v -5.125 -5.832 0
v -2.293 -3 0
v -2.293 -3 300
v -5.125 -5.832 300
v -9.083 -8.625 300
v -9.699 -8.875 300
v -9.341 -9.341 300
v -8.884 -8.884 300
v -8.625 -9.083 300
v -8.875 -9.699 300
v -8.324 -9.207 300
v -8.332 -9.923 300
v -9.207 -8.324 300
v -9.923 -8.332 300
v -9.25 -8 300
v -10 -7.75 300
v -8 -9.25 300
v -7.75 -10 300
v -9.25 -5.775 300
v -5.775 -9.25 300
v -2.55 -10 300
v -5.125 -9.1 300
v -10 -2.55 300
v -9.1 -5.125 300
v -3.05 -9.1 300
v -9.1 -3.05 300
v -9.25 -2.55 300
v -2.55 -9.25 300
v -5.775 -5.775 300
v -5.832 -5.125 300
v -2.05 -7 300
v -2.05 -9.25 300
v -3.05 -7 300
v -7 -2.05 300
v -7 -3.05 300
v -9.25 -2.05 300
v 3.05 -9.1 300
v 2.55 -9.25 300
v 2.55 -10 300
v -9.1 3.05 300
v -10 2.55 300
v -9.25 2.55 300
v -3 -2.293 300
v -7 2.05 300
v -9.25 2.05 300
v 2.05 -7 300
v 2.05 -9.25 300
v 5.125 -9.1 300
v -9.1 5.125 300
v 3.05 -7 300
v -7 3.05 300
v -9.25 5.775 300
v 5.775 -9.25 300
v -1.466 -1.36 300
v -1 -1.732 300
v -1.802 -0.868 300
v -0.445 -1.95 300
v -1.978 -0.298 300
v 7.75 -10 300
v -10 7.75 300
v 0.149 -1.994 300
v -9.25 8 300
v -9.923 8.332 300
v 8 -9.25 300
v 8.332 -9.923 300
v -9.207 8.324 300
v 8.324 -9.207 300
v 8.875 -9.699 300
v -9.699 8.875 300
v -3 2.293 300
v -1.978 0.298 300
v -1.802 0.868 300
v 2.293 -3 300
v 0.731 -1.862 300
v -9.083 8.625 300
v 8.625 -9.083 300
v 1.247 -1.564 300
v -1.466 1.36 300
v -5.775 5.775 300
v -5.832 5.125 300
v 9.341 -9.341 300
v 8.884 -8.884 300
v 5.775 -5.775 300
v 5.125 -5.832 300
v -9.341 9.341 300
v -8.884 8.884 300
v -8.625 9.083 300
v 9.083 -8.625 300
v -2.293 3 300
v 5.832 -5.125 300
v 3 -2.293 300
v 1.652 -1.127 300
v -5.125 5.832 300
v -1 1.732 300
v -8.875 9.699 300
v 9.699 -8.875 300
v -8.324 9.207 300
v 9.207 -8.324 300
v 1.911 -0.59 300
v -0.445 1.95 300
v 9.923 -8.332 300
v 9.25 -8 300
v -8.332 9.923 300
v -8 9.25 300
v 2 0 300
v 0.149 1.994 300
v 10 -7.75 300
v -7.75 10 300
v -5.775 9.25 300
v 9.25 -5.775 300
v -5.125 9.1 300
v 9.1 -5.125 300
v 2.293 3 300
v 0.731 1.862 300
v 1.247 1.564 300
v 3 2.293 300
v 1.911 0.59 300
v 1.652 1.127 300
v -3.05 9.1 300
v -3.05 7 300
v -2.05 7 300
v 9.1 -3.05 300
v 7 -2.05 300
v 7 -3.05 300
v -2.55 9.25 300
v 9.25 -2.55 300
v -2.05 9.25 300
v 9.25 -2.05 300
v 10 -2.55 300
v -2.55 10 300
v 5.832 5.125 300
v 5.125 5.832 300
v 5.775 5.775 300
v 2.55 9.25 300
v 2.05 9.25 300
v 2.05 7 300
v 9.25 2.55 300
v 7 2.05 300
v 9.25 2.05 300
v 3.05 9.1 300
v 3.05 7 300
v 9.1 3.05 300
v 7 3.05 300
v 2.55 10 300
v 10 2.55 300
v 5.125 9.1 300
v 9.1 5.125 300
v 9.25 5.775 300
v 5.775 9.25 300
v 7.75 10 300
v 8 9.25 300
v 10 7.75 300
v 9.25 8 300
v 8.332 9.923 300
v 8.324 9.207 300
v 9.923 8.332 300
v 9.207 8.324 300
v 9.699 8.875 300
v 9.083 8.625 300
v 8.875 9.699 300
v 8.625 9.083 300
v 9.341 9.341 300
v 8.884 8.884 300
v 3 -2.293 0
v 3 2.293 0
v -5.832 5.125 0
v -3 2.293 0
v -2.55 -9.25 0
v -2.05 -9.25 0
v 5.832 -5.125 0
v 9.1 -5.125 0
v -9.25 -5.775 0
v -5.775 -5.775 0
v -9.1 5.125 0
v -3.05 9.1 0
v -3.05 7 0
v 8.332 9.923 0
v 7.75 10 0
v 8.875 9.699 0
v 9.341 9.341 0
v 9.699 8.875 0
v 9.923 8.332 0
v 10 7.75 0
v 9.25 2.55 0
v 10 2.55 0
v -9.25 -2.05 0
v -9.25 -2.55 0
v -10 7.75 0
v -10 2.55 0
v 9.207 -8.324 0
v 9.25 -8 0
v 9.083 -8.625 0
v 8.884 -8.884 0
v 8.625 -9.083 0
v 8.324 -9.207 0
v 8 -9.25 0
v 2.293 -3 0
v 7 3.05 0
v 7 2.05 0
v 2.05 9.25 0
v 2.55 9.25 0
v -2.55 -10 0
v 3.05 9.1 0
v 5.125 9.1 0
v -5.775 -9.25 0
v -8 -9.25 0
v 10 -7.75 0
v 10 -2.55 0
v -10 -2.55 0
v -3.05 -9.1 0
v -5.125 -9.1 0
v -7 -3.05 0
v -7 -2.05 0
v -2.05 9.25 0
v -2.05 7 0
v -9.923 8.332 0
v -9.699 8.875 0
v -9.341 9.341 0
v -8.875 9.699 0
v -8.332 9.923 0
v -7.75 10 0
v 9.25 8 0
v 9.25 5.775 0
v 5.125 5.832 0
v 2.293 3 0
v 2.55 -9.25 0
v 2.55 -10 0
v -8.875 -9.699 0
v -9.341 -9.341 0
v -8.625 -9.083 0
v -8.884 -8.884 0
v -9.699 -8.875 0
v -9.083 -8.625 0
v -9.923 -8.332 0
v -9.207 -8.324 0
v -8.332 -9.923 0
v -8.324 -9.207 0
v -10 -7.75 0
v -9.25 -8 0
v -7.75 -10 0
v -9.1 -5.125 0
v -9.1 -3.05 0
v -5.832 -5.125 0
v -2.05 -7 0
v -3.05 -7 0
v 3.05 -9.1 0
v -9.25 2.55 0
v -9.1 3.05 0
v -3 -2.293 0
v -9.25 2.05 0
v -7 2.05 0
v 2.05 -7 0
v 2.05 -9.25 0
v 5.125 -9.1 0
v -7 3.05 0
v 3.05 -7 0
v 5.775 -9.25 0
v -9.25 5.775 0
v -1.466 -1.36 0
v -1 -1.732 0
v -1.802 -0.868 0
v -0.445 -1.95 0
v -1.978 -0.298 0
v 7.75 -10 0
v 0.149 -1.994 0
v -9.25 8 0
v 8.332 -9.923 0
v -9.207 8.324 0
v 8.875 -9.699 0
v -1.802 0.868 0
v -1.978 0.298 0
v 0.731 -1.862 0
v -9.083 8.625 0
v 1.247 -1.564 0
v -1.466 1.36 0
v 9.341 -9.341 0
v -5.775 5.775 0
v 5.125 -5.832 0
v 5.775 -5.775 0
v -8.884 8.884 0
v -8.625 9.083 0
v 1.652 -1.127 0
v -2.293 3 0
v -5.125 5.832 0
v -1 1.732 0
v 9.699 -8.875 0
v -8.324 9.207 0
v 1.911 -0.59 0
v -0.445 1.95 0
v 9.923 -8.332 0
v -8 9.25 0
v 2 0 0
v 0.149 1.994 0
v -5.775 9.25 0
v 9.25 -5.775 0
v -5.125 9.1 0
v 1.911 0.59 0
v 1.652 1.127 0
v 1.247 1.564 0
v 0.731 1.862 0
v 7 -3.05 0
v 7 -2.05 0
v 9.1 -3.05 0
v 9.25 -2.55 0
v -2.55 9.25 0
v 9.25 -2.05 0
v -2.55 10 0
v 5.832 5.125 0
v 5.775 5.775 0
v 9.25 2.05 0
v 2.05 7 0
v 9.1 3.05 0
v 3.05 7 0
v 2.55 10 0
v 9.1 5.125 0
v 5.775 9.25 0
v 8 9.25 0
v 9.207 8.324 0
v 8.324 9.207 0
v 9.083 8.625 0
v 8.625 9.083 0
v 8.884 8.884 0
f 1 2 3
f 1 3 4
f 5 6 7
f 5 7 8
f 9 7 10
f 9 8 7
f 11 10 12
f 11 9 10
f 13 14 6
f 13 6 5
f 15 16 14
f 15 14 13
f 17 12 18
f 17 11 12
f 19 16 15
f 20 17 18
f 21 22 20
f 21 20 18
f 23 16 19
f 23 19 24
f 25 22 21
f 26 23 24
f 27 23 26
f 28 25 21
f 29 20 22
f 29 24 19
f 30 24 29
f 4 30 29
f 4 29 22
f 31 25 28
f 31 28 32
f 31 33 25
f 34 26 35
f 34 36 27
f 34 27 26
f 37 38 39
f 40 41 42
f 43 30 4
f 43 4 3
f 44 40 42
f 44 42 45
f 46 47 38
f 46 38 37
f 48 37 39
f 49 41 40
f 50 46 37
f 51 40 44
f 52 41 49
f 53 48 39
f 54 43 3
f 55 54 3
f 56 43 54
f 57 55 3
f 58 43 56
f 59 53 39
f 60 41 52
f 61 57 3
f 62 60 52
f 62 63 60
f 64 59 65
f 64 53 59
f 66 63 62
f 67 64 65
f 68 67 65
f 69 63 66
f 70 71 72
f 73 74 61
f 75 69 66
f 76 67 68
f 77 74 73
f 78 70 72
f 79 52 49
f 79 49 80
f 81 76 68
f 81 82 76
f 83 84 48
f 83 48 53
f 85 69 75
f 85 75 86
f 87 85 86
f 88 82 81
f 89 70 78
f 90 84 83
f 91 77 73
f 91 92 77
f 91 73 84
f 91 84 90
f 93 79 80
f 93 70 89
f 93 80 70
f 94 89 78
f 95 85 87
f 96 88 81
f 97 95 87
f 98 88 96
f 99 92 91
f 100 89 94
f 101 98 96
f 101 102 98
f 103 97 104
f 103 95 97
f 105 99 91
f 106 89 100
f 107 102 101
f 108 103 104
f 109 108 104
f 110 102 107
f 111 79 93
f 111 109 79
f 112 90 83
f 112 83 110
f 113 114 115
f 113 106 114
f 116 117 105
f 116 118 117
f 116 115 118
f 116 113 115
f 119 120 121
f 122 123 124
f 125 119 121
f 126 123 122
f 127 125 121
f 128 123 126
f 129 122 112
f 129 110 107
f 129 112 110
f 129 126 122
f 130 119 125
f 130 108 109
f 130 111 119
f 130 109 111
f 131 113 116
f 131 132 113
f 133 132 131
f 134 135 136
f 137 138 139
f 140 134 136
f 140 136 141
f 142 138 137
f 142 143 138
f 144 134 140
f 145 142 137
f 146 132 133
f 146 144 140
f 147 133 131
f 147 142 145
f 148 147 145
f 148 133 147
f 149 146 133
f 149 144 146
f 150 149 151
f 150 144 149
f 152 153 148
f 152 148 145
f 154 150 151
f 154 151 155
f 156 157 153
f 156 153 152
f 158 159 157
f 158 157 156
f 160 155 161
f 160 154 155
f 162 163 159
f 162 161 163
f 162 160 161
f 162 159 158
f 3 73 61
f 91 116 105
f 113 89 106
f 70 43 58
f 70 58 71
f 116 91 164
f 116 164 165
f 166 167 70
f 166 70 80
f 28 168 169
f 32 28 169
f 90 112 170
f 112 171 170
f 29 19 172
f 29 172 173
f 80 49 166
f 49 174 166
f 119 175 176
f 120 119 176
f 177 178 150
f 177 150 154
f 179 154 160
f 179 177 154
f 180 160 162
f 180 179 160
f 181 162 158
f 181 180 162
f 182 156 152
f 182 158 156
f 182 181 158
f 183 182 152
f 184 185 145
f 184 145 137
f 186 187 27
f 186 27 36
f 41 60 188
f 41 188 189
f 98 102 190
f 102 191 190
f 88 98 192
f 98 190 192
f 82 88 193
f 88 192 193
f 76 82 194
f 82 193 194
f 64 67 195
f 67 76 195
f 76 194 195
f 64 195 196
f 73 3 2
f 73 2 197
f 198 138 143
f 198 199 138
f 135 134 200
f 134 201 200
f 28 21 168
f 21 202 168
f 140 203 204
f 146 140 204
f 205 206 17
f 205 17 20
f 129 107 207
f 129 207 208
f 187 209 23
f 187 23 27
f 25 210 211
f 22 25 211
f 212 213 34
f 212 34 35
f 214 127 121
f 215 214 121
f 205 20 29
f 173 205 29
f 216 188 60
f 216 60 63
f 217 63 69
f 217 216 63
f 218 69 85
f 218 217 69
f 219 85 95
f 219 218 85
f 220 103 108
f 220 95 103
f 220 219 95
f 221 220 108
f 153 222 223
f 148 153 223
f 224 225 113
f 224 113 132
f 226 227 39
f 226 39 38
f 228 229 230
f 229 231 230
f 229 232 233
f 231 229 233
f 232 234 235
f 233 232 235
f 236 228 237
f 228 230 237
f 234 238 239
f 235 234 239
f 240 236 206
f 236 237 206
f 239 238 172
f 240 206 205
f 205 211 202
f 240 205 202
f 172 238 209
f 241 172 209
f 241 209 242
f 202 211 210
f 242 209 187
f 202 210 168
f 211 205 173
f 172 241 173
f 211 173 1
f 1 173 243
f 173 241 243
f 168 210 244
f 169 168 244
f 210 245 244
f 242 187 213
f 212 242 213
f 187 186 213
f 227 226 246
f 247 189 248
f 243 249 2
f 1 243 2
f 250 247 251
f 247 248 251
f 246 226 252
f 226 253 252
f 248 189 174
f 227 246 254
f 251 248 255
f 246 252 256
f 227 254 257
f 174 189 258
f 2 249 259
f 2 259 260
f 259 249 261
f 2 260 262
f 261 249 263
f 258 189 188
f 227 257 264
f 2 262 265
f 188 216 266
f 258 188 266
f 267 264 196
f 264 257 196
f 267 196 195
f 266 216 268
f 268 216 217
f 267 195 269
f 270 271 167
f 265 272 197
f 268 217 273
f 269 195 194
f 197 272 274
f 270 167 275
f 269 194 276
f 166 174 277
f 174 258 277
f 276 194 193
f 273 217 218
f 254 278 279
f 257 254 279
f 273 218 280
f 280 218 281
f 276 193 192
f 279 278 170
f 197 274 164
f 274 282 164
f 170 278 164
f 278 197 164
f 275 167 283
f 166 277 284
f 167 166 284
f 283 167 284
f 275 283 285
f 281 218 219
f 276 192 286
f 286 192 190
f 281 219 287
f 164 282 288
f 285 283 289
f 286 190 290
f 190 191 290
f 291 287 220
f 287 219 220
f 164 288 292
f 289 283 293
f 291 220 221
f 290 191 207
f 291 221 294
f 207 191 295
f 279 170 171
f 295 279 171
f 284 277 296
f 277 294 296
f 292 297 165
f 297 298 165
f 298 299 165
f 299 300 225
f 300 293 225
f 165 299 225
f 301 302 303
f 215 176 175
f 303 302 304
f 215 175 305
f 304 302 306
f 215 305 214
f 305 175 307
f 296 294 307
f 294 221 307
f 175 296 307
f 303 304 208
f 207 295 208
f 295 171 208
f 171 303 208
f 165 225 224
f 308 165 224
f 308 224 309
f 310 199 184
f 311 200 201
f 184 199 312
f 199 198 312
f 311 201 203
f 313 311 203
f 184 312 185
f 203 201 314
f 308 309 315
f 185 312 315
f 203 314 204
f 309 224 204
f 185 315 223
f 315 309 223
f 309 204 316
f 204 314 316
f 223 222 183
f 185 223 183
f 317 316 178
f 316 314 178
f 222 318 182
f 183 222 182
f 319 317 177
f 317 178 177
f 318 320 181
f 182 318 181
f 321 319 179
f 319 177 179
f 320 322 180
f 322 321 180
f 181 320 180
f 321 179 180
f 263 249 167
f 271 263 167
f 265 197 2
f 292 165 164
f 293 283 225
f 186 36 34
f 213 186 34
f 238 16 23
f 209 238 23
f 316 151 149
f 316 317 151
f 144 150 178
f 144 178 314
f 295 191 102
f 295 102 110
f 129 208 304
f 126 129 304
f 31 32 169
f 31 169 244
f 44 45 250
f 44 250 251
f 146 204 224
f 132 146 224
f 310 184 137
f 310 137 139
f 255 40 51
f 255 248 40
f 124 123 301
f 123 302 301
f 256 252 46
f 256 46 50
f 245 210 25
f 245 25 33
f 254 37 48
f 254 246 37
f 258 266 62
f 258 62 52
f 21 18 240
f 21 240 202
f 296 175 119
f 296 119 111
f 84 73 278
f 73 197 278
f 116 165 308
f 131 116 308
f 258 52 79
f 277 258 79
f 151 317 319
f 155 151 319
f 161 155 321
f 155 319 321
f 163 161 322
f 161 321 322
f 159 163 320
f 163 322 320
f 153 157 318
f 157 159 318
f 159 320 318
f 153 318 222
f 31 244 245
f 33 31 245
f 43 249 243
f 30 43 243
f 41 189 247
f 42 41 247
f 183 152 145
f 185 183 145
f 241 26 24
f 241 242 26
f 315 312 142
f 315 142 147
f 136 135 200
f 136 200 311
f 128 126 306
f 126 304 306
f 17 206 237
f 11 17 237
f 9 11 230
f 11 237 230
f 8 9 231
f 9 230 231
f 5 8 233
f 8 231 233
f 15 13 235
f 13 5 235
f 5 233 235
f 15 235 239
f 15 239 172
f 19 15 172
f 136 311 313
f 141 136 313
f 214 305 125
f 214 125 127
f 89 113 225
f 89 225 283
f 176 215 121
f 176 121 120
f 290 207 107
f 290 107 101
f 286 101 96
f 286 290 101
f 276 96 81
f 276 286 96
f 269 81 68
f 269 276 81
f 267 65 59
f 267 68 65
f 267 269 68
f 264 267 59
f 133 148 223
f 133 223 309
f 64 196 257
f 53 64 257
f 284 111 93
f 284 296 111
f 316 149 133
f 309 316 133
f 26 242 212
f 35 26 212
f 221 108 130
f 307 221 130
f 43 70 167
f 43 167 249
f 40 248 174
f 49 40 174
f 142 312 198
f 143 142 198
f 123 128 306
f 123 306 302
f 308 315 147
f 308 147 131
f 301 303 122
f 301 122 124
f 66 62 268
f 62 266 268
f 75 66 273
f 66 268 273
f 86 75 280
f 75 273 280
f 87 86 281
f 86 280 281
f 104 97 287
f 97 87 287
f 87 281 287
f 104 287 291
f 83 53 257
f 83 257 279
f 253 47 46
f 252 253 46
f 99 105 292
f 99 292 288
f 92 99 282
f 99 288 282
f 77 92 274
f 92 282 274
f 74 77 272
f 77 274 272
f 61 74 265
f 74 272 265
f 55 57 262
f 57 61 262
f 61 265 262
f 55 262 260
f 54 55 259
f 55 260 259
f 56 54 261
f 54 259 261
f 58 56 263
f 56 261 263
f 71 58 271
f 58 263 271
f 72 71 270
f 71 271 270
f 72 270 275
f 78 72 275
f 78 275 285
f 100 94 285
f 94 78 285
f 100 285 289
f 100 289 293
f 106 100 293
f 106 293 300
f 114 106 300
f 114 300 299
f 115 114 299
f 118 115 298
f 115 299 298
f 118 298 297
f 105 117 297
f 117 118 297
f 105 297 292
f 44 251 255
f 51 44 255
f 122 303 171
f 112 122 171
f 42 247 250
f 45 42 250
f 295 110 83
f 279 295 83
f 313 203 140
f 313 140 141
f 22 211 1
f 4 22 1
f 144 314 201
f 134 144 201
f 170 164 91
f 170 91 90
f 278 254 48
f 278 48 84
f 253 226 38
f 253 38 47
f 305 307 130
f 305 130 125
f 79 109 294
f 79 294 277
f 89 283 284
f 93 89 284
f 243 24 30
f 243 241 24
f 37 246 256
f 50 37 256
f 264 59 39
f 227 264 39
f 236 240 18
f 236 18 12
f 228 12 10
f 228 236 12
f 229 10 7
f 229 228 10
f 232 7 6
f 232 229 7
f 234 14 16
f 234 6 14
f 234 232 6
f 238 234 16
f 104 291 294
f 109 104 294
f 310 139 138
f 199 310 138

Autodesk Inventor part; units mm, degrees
ref_plane "YZ Plane" through (0, 0, 0) normal (1, 0, 0) x (0, 1, 0)
ref_plane "XZ Plane" through (0, 0, 0) normal (0, 1, 0) x (-1, 0, 0)
ref_plane "XY Plane" through (0, 0, 0) normal (0, 0, 1) x (1, 0, 0)
sketch "Sketch1" plane through (0, 0, 0) normal (0, 0, 1) x (1, 0, 0)
  line L0 (-2.55, -10) -> (-2.55, -9.25)
  line L1 (-2.55, -9.25) -> (-2.05, -9.25)
  line L2 (-7.75, -10) -> (-2.55, -10)
  line L3 (-2.05, -9.25) -> (-2.05, -7)
  line L4 (-2.05, -7) -> (-3.05, -7)
  line L5 (-3.05, -9.1) -> (-3.05, -7)
  line L6 (-3.05, -9.1) -> (-5.125, -9.1)
  line L7 (-5.125, -9.1) -> (-5.125, -5.8321)
  line L8 (-8, -9.25) -> (-5.775, -9.25)
  line L9 (-5.775, -9.25) -> (-5.775, -5.775)
  line L10 (-2.2929, -3) -> (2.2929, -3)
  line L11 (3, -2.2929) -> (3, 2.2929)
  line L12 (2.2929, 3) -> (-2.2929, 3)
  line L13 (-3, 2.2929) -> (-3, -2.2929)
  line L14 (-2.2929, -3) -> (-5.125, -5.8321)
  line L15 (-3, -2.2929) -> (-5.8321, -5.125)
  line L16 (-9.1, -5.125) -> (-5.8321, -5.125)
  line L17 (-9.25, -5.775) -> (-5.775, -5.775)
  line L18 (-9.25, -8) -> (-9.25, -5.775)
  line L19 (-10, -7.75) -> (-10, -2.55)
  line L20 (-9.1, -3.05) -> (-9.1, -5.125)
  line L21 (-9.1, -3.05) -> (-7, -3.05)
  line L22 (-9.25, -2.55) -> (-9.25, -2.05)
  line L23 (-9.25, -2.05) -> (-7, -2.05)
  line L24 (-7, -2.05) -> (-7, -3.05)
  line L25 (-10, -2.55) -> (-9.25, -2.55)
  arc A0 (-9.25, -8) -> (-8, -9.25) centre (-8, -8) ccw
  arc A1 (-10, -7.75) -> (-7.75, -10) centre (-7.75, -7.75) ccw
  line L26 (3, -2.2929) -> (5.8321, -5.125)
  line L27 (2.2929, -3) -> (5.125, -5.8321)
  line L28 (5.775, -9.25) -> (5.775, -5.775)
  line L29 (8, -9.25) -> (5.775, -9.25)
  line L30 (7.75, -10) -> (2.55, -10)
  line L31 (3.05, -9.1) -> (5.125, -9.1)
  line L32 (2.55, -10) -> (2.55, -9.25)
  line L33 (3.05, -9.1) -> (3.05, -7)
  line L34 (2.05, -9.25) -> (2.05, -7)
  line L35 (2.55, -9.25) -> (2.05, -9.25)
  line L36 (2.05, -7) -> (3.05, -7)
  line L37 (5.125, -9.1) -> (5.125, -5.8321)
  arc A2 (8, -9.25) -> (9.25, -8) centre (8, -8) ccw
  arc A3 (7.75, -10) -> (10, -7.75) centre (7.75, -7.75) ccw
  line L38 (9.25, -8) -> (9.25, -5.775)
  line L39 (10, -7.75) -> (10, -2.55)
  line L40 (9.25, -5.775) -> (5.775, -5.775)
  line L41 (9.1, -5.125) -> (5.8321, -5.125)
  line L42 (9.1, -3.05) -> (7, -3.05)
  line L43 (7, -2.05) -> (7, -3.05)
  line L44 (9.25, -2.05) -> (7, -2.05)
  line L45 (9.25, -2.55) -> (9.25, -2.05)
  line L46 (10, -2.55) -> (9.25, -2.55)
  line L47 (9.1, -3.05) -> (9.1, -5.125)
  line L48 (2.2929, 3) -> (5.125, 5.8321)
  line L49 (3, 2.2929) -> (5.8321, 5.125)
  line L50 (9.25, 5.775) -> (5.775, 5.775)
  line L51 (9.25, 8) -> (9.25, 5.775)
  line L52 (10, 7.75) -> (10, 2.55)
  line L53 (9.1, 3.05) -> (9.1, 5.125)
  line L54 (10, 2.55) -> (9.25, 2.55)
  line L55 (9.1, 3.05) -> (7, 3.05)
  line L56 (9.25, 2.05) -> (7, 2.05)
  line L57 (9.25, 2.55) -> (9.25, 2.05)
  line L58 (7, 2.05) -> (7, 3.05)
  line L59 (9.1, 5.125) -> (5.8321, 5.125)
  arc A4 (9.25, 8) -> (8, 9.25) centre (8, 8) ccw
  arc A5 (10, 7.75) -> (7.75, 10) centre (7.75, 7.75) ccw
  line L60 (8, 9.25) -> (5.775, 9.25)
  line L61 (7.75, 10) -> (2.55, 10)
  line L62 (5.775, 9.25) -> (5.775, 5.775)
  line L63 (5.125, 9.1) -> (5.125, 5.8321)
  line L64 (3.05, 9.1) -> (3.05, 7)
  line L65 (2.05, 7) -> (3.05, 7)
  line L66 (2.05, 9.25) -> (2.05, 7)
  line L67 (2.55, 9.25) -> (2.05, 9.25)
  line L68 (2.55, 10) -> (2.55, 9.25)
  line L69 (3.05, 9.1) -> (5.125, 9.1)
  line L70 (-3, 2.2929) -> (-5.8321, 5.125)
  line L71 (-2.2929, 3) -> (-5.125, 5.8321)
  line L72 (-5.775, 9.25) -> (-5.775, 5.775)
  line L73 (-8, 9.25) -> (-5.775, 9.25)
  line L74 (-7.75, 10) -> (-2.55, 10)
  line L75 (-3.05, 9.1) -> (-5.125, 9.1)
  line L76 (-2.55, 10) -> (-2.55, 9.25)
  line L77 (-3.05, 9.1) -> (-3.05, 7)
  line L78 (-2.05, 9.25) -> (-2.05, 7)
  line L79 (-2.55, 9.25) -> (-2.05, 9.25)
  line L80 (-2.05, 7) -> (-3.05, 7)
  line L81 (-5.125, 9.1) -> (-5.125, 5.8321)
  arc A6 (-8, 9.25) -> (-9.25, 8) centre (-8, 8) ccw
  arc A7 (-7.75, 10) -> (-10, 7.75) centre (-7.75, 7.75) ccw
  line L82 (-9.25, 8) -> (-9.25, 5.775)
  line L83 (-10, 7.75) -> (-10, 2.55)
  line L84 (-9.25, 5.775) -> (-5.775, 5.775)
  line L85 (-9.1, 5.125) -> (-5.8321, 5.125)
  line L86 (-9.1, 3.05) -> (-7, 3.05)
  line L87 (-7, 2.05) -> (-7, 3.05)
  line L88 (-9.25, 2.05) -> (-7, 2.05)
  line L89 (-9.25, 2.55) -> (-9.25, 2.05)
  line L90 (-10, 2.55) -> (-9.25, 2.55)
  line L91 (-9.1, 3.05) -> (-9.1, 5.125)
  circle A8 centre (0, 0) radius 2
  point P0 (-10, -10)
  point P1 (10, -10)
  point P2 (10, 10)
  point P3 (-10, 10)
  dimension "d2" = 0.75
  dimension "d3" = 7.45
  dimension "d4" = 2.25
  dimension "d5" = 1
  dimension "d6" = 2.1
  dimension "d7" = 0.75
  dimension "d8" = 0.65
  dimension "d9" = 1.25
  dimension "d10" = 2.25
  dimension "d11" = 360
  dimension "d12" = 4
  dimension "d13" = 20
extrude "Extrusion1" add sketch "Sketch1" along normal blind 300
properties part number "2020 dai 300"
